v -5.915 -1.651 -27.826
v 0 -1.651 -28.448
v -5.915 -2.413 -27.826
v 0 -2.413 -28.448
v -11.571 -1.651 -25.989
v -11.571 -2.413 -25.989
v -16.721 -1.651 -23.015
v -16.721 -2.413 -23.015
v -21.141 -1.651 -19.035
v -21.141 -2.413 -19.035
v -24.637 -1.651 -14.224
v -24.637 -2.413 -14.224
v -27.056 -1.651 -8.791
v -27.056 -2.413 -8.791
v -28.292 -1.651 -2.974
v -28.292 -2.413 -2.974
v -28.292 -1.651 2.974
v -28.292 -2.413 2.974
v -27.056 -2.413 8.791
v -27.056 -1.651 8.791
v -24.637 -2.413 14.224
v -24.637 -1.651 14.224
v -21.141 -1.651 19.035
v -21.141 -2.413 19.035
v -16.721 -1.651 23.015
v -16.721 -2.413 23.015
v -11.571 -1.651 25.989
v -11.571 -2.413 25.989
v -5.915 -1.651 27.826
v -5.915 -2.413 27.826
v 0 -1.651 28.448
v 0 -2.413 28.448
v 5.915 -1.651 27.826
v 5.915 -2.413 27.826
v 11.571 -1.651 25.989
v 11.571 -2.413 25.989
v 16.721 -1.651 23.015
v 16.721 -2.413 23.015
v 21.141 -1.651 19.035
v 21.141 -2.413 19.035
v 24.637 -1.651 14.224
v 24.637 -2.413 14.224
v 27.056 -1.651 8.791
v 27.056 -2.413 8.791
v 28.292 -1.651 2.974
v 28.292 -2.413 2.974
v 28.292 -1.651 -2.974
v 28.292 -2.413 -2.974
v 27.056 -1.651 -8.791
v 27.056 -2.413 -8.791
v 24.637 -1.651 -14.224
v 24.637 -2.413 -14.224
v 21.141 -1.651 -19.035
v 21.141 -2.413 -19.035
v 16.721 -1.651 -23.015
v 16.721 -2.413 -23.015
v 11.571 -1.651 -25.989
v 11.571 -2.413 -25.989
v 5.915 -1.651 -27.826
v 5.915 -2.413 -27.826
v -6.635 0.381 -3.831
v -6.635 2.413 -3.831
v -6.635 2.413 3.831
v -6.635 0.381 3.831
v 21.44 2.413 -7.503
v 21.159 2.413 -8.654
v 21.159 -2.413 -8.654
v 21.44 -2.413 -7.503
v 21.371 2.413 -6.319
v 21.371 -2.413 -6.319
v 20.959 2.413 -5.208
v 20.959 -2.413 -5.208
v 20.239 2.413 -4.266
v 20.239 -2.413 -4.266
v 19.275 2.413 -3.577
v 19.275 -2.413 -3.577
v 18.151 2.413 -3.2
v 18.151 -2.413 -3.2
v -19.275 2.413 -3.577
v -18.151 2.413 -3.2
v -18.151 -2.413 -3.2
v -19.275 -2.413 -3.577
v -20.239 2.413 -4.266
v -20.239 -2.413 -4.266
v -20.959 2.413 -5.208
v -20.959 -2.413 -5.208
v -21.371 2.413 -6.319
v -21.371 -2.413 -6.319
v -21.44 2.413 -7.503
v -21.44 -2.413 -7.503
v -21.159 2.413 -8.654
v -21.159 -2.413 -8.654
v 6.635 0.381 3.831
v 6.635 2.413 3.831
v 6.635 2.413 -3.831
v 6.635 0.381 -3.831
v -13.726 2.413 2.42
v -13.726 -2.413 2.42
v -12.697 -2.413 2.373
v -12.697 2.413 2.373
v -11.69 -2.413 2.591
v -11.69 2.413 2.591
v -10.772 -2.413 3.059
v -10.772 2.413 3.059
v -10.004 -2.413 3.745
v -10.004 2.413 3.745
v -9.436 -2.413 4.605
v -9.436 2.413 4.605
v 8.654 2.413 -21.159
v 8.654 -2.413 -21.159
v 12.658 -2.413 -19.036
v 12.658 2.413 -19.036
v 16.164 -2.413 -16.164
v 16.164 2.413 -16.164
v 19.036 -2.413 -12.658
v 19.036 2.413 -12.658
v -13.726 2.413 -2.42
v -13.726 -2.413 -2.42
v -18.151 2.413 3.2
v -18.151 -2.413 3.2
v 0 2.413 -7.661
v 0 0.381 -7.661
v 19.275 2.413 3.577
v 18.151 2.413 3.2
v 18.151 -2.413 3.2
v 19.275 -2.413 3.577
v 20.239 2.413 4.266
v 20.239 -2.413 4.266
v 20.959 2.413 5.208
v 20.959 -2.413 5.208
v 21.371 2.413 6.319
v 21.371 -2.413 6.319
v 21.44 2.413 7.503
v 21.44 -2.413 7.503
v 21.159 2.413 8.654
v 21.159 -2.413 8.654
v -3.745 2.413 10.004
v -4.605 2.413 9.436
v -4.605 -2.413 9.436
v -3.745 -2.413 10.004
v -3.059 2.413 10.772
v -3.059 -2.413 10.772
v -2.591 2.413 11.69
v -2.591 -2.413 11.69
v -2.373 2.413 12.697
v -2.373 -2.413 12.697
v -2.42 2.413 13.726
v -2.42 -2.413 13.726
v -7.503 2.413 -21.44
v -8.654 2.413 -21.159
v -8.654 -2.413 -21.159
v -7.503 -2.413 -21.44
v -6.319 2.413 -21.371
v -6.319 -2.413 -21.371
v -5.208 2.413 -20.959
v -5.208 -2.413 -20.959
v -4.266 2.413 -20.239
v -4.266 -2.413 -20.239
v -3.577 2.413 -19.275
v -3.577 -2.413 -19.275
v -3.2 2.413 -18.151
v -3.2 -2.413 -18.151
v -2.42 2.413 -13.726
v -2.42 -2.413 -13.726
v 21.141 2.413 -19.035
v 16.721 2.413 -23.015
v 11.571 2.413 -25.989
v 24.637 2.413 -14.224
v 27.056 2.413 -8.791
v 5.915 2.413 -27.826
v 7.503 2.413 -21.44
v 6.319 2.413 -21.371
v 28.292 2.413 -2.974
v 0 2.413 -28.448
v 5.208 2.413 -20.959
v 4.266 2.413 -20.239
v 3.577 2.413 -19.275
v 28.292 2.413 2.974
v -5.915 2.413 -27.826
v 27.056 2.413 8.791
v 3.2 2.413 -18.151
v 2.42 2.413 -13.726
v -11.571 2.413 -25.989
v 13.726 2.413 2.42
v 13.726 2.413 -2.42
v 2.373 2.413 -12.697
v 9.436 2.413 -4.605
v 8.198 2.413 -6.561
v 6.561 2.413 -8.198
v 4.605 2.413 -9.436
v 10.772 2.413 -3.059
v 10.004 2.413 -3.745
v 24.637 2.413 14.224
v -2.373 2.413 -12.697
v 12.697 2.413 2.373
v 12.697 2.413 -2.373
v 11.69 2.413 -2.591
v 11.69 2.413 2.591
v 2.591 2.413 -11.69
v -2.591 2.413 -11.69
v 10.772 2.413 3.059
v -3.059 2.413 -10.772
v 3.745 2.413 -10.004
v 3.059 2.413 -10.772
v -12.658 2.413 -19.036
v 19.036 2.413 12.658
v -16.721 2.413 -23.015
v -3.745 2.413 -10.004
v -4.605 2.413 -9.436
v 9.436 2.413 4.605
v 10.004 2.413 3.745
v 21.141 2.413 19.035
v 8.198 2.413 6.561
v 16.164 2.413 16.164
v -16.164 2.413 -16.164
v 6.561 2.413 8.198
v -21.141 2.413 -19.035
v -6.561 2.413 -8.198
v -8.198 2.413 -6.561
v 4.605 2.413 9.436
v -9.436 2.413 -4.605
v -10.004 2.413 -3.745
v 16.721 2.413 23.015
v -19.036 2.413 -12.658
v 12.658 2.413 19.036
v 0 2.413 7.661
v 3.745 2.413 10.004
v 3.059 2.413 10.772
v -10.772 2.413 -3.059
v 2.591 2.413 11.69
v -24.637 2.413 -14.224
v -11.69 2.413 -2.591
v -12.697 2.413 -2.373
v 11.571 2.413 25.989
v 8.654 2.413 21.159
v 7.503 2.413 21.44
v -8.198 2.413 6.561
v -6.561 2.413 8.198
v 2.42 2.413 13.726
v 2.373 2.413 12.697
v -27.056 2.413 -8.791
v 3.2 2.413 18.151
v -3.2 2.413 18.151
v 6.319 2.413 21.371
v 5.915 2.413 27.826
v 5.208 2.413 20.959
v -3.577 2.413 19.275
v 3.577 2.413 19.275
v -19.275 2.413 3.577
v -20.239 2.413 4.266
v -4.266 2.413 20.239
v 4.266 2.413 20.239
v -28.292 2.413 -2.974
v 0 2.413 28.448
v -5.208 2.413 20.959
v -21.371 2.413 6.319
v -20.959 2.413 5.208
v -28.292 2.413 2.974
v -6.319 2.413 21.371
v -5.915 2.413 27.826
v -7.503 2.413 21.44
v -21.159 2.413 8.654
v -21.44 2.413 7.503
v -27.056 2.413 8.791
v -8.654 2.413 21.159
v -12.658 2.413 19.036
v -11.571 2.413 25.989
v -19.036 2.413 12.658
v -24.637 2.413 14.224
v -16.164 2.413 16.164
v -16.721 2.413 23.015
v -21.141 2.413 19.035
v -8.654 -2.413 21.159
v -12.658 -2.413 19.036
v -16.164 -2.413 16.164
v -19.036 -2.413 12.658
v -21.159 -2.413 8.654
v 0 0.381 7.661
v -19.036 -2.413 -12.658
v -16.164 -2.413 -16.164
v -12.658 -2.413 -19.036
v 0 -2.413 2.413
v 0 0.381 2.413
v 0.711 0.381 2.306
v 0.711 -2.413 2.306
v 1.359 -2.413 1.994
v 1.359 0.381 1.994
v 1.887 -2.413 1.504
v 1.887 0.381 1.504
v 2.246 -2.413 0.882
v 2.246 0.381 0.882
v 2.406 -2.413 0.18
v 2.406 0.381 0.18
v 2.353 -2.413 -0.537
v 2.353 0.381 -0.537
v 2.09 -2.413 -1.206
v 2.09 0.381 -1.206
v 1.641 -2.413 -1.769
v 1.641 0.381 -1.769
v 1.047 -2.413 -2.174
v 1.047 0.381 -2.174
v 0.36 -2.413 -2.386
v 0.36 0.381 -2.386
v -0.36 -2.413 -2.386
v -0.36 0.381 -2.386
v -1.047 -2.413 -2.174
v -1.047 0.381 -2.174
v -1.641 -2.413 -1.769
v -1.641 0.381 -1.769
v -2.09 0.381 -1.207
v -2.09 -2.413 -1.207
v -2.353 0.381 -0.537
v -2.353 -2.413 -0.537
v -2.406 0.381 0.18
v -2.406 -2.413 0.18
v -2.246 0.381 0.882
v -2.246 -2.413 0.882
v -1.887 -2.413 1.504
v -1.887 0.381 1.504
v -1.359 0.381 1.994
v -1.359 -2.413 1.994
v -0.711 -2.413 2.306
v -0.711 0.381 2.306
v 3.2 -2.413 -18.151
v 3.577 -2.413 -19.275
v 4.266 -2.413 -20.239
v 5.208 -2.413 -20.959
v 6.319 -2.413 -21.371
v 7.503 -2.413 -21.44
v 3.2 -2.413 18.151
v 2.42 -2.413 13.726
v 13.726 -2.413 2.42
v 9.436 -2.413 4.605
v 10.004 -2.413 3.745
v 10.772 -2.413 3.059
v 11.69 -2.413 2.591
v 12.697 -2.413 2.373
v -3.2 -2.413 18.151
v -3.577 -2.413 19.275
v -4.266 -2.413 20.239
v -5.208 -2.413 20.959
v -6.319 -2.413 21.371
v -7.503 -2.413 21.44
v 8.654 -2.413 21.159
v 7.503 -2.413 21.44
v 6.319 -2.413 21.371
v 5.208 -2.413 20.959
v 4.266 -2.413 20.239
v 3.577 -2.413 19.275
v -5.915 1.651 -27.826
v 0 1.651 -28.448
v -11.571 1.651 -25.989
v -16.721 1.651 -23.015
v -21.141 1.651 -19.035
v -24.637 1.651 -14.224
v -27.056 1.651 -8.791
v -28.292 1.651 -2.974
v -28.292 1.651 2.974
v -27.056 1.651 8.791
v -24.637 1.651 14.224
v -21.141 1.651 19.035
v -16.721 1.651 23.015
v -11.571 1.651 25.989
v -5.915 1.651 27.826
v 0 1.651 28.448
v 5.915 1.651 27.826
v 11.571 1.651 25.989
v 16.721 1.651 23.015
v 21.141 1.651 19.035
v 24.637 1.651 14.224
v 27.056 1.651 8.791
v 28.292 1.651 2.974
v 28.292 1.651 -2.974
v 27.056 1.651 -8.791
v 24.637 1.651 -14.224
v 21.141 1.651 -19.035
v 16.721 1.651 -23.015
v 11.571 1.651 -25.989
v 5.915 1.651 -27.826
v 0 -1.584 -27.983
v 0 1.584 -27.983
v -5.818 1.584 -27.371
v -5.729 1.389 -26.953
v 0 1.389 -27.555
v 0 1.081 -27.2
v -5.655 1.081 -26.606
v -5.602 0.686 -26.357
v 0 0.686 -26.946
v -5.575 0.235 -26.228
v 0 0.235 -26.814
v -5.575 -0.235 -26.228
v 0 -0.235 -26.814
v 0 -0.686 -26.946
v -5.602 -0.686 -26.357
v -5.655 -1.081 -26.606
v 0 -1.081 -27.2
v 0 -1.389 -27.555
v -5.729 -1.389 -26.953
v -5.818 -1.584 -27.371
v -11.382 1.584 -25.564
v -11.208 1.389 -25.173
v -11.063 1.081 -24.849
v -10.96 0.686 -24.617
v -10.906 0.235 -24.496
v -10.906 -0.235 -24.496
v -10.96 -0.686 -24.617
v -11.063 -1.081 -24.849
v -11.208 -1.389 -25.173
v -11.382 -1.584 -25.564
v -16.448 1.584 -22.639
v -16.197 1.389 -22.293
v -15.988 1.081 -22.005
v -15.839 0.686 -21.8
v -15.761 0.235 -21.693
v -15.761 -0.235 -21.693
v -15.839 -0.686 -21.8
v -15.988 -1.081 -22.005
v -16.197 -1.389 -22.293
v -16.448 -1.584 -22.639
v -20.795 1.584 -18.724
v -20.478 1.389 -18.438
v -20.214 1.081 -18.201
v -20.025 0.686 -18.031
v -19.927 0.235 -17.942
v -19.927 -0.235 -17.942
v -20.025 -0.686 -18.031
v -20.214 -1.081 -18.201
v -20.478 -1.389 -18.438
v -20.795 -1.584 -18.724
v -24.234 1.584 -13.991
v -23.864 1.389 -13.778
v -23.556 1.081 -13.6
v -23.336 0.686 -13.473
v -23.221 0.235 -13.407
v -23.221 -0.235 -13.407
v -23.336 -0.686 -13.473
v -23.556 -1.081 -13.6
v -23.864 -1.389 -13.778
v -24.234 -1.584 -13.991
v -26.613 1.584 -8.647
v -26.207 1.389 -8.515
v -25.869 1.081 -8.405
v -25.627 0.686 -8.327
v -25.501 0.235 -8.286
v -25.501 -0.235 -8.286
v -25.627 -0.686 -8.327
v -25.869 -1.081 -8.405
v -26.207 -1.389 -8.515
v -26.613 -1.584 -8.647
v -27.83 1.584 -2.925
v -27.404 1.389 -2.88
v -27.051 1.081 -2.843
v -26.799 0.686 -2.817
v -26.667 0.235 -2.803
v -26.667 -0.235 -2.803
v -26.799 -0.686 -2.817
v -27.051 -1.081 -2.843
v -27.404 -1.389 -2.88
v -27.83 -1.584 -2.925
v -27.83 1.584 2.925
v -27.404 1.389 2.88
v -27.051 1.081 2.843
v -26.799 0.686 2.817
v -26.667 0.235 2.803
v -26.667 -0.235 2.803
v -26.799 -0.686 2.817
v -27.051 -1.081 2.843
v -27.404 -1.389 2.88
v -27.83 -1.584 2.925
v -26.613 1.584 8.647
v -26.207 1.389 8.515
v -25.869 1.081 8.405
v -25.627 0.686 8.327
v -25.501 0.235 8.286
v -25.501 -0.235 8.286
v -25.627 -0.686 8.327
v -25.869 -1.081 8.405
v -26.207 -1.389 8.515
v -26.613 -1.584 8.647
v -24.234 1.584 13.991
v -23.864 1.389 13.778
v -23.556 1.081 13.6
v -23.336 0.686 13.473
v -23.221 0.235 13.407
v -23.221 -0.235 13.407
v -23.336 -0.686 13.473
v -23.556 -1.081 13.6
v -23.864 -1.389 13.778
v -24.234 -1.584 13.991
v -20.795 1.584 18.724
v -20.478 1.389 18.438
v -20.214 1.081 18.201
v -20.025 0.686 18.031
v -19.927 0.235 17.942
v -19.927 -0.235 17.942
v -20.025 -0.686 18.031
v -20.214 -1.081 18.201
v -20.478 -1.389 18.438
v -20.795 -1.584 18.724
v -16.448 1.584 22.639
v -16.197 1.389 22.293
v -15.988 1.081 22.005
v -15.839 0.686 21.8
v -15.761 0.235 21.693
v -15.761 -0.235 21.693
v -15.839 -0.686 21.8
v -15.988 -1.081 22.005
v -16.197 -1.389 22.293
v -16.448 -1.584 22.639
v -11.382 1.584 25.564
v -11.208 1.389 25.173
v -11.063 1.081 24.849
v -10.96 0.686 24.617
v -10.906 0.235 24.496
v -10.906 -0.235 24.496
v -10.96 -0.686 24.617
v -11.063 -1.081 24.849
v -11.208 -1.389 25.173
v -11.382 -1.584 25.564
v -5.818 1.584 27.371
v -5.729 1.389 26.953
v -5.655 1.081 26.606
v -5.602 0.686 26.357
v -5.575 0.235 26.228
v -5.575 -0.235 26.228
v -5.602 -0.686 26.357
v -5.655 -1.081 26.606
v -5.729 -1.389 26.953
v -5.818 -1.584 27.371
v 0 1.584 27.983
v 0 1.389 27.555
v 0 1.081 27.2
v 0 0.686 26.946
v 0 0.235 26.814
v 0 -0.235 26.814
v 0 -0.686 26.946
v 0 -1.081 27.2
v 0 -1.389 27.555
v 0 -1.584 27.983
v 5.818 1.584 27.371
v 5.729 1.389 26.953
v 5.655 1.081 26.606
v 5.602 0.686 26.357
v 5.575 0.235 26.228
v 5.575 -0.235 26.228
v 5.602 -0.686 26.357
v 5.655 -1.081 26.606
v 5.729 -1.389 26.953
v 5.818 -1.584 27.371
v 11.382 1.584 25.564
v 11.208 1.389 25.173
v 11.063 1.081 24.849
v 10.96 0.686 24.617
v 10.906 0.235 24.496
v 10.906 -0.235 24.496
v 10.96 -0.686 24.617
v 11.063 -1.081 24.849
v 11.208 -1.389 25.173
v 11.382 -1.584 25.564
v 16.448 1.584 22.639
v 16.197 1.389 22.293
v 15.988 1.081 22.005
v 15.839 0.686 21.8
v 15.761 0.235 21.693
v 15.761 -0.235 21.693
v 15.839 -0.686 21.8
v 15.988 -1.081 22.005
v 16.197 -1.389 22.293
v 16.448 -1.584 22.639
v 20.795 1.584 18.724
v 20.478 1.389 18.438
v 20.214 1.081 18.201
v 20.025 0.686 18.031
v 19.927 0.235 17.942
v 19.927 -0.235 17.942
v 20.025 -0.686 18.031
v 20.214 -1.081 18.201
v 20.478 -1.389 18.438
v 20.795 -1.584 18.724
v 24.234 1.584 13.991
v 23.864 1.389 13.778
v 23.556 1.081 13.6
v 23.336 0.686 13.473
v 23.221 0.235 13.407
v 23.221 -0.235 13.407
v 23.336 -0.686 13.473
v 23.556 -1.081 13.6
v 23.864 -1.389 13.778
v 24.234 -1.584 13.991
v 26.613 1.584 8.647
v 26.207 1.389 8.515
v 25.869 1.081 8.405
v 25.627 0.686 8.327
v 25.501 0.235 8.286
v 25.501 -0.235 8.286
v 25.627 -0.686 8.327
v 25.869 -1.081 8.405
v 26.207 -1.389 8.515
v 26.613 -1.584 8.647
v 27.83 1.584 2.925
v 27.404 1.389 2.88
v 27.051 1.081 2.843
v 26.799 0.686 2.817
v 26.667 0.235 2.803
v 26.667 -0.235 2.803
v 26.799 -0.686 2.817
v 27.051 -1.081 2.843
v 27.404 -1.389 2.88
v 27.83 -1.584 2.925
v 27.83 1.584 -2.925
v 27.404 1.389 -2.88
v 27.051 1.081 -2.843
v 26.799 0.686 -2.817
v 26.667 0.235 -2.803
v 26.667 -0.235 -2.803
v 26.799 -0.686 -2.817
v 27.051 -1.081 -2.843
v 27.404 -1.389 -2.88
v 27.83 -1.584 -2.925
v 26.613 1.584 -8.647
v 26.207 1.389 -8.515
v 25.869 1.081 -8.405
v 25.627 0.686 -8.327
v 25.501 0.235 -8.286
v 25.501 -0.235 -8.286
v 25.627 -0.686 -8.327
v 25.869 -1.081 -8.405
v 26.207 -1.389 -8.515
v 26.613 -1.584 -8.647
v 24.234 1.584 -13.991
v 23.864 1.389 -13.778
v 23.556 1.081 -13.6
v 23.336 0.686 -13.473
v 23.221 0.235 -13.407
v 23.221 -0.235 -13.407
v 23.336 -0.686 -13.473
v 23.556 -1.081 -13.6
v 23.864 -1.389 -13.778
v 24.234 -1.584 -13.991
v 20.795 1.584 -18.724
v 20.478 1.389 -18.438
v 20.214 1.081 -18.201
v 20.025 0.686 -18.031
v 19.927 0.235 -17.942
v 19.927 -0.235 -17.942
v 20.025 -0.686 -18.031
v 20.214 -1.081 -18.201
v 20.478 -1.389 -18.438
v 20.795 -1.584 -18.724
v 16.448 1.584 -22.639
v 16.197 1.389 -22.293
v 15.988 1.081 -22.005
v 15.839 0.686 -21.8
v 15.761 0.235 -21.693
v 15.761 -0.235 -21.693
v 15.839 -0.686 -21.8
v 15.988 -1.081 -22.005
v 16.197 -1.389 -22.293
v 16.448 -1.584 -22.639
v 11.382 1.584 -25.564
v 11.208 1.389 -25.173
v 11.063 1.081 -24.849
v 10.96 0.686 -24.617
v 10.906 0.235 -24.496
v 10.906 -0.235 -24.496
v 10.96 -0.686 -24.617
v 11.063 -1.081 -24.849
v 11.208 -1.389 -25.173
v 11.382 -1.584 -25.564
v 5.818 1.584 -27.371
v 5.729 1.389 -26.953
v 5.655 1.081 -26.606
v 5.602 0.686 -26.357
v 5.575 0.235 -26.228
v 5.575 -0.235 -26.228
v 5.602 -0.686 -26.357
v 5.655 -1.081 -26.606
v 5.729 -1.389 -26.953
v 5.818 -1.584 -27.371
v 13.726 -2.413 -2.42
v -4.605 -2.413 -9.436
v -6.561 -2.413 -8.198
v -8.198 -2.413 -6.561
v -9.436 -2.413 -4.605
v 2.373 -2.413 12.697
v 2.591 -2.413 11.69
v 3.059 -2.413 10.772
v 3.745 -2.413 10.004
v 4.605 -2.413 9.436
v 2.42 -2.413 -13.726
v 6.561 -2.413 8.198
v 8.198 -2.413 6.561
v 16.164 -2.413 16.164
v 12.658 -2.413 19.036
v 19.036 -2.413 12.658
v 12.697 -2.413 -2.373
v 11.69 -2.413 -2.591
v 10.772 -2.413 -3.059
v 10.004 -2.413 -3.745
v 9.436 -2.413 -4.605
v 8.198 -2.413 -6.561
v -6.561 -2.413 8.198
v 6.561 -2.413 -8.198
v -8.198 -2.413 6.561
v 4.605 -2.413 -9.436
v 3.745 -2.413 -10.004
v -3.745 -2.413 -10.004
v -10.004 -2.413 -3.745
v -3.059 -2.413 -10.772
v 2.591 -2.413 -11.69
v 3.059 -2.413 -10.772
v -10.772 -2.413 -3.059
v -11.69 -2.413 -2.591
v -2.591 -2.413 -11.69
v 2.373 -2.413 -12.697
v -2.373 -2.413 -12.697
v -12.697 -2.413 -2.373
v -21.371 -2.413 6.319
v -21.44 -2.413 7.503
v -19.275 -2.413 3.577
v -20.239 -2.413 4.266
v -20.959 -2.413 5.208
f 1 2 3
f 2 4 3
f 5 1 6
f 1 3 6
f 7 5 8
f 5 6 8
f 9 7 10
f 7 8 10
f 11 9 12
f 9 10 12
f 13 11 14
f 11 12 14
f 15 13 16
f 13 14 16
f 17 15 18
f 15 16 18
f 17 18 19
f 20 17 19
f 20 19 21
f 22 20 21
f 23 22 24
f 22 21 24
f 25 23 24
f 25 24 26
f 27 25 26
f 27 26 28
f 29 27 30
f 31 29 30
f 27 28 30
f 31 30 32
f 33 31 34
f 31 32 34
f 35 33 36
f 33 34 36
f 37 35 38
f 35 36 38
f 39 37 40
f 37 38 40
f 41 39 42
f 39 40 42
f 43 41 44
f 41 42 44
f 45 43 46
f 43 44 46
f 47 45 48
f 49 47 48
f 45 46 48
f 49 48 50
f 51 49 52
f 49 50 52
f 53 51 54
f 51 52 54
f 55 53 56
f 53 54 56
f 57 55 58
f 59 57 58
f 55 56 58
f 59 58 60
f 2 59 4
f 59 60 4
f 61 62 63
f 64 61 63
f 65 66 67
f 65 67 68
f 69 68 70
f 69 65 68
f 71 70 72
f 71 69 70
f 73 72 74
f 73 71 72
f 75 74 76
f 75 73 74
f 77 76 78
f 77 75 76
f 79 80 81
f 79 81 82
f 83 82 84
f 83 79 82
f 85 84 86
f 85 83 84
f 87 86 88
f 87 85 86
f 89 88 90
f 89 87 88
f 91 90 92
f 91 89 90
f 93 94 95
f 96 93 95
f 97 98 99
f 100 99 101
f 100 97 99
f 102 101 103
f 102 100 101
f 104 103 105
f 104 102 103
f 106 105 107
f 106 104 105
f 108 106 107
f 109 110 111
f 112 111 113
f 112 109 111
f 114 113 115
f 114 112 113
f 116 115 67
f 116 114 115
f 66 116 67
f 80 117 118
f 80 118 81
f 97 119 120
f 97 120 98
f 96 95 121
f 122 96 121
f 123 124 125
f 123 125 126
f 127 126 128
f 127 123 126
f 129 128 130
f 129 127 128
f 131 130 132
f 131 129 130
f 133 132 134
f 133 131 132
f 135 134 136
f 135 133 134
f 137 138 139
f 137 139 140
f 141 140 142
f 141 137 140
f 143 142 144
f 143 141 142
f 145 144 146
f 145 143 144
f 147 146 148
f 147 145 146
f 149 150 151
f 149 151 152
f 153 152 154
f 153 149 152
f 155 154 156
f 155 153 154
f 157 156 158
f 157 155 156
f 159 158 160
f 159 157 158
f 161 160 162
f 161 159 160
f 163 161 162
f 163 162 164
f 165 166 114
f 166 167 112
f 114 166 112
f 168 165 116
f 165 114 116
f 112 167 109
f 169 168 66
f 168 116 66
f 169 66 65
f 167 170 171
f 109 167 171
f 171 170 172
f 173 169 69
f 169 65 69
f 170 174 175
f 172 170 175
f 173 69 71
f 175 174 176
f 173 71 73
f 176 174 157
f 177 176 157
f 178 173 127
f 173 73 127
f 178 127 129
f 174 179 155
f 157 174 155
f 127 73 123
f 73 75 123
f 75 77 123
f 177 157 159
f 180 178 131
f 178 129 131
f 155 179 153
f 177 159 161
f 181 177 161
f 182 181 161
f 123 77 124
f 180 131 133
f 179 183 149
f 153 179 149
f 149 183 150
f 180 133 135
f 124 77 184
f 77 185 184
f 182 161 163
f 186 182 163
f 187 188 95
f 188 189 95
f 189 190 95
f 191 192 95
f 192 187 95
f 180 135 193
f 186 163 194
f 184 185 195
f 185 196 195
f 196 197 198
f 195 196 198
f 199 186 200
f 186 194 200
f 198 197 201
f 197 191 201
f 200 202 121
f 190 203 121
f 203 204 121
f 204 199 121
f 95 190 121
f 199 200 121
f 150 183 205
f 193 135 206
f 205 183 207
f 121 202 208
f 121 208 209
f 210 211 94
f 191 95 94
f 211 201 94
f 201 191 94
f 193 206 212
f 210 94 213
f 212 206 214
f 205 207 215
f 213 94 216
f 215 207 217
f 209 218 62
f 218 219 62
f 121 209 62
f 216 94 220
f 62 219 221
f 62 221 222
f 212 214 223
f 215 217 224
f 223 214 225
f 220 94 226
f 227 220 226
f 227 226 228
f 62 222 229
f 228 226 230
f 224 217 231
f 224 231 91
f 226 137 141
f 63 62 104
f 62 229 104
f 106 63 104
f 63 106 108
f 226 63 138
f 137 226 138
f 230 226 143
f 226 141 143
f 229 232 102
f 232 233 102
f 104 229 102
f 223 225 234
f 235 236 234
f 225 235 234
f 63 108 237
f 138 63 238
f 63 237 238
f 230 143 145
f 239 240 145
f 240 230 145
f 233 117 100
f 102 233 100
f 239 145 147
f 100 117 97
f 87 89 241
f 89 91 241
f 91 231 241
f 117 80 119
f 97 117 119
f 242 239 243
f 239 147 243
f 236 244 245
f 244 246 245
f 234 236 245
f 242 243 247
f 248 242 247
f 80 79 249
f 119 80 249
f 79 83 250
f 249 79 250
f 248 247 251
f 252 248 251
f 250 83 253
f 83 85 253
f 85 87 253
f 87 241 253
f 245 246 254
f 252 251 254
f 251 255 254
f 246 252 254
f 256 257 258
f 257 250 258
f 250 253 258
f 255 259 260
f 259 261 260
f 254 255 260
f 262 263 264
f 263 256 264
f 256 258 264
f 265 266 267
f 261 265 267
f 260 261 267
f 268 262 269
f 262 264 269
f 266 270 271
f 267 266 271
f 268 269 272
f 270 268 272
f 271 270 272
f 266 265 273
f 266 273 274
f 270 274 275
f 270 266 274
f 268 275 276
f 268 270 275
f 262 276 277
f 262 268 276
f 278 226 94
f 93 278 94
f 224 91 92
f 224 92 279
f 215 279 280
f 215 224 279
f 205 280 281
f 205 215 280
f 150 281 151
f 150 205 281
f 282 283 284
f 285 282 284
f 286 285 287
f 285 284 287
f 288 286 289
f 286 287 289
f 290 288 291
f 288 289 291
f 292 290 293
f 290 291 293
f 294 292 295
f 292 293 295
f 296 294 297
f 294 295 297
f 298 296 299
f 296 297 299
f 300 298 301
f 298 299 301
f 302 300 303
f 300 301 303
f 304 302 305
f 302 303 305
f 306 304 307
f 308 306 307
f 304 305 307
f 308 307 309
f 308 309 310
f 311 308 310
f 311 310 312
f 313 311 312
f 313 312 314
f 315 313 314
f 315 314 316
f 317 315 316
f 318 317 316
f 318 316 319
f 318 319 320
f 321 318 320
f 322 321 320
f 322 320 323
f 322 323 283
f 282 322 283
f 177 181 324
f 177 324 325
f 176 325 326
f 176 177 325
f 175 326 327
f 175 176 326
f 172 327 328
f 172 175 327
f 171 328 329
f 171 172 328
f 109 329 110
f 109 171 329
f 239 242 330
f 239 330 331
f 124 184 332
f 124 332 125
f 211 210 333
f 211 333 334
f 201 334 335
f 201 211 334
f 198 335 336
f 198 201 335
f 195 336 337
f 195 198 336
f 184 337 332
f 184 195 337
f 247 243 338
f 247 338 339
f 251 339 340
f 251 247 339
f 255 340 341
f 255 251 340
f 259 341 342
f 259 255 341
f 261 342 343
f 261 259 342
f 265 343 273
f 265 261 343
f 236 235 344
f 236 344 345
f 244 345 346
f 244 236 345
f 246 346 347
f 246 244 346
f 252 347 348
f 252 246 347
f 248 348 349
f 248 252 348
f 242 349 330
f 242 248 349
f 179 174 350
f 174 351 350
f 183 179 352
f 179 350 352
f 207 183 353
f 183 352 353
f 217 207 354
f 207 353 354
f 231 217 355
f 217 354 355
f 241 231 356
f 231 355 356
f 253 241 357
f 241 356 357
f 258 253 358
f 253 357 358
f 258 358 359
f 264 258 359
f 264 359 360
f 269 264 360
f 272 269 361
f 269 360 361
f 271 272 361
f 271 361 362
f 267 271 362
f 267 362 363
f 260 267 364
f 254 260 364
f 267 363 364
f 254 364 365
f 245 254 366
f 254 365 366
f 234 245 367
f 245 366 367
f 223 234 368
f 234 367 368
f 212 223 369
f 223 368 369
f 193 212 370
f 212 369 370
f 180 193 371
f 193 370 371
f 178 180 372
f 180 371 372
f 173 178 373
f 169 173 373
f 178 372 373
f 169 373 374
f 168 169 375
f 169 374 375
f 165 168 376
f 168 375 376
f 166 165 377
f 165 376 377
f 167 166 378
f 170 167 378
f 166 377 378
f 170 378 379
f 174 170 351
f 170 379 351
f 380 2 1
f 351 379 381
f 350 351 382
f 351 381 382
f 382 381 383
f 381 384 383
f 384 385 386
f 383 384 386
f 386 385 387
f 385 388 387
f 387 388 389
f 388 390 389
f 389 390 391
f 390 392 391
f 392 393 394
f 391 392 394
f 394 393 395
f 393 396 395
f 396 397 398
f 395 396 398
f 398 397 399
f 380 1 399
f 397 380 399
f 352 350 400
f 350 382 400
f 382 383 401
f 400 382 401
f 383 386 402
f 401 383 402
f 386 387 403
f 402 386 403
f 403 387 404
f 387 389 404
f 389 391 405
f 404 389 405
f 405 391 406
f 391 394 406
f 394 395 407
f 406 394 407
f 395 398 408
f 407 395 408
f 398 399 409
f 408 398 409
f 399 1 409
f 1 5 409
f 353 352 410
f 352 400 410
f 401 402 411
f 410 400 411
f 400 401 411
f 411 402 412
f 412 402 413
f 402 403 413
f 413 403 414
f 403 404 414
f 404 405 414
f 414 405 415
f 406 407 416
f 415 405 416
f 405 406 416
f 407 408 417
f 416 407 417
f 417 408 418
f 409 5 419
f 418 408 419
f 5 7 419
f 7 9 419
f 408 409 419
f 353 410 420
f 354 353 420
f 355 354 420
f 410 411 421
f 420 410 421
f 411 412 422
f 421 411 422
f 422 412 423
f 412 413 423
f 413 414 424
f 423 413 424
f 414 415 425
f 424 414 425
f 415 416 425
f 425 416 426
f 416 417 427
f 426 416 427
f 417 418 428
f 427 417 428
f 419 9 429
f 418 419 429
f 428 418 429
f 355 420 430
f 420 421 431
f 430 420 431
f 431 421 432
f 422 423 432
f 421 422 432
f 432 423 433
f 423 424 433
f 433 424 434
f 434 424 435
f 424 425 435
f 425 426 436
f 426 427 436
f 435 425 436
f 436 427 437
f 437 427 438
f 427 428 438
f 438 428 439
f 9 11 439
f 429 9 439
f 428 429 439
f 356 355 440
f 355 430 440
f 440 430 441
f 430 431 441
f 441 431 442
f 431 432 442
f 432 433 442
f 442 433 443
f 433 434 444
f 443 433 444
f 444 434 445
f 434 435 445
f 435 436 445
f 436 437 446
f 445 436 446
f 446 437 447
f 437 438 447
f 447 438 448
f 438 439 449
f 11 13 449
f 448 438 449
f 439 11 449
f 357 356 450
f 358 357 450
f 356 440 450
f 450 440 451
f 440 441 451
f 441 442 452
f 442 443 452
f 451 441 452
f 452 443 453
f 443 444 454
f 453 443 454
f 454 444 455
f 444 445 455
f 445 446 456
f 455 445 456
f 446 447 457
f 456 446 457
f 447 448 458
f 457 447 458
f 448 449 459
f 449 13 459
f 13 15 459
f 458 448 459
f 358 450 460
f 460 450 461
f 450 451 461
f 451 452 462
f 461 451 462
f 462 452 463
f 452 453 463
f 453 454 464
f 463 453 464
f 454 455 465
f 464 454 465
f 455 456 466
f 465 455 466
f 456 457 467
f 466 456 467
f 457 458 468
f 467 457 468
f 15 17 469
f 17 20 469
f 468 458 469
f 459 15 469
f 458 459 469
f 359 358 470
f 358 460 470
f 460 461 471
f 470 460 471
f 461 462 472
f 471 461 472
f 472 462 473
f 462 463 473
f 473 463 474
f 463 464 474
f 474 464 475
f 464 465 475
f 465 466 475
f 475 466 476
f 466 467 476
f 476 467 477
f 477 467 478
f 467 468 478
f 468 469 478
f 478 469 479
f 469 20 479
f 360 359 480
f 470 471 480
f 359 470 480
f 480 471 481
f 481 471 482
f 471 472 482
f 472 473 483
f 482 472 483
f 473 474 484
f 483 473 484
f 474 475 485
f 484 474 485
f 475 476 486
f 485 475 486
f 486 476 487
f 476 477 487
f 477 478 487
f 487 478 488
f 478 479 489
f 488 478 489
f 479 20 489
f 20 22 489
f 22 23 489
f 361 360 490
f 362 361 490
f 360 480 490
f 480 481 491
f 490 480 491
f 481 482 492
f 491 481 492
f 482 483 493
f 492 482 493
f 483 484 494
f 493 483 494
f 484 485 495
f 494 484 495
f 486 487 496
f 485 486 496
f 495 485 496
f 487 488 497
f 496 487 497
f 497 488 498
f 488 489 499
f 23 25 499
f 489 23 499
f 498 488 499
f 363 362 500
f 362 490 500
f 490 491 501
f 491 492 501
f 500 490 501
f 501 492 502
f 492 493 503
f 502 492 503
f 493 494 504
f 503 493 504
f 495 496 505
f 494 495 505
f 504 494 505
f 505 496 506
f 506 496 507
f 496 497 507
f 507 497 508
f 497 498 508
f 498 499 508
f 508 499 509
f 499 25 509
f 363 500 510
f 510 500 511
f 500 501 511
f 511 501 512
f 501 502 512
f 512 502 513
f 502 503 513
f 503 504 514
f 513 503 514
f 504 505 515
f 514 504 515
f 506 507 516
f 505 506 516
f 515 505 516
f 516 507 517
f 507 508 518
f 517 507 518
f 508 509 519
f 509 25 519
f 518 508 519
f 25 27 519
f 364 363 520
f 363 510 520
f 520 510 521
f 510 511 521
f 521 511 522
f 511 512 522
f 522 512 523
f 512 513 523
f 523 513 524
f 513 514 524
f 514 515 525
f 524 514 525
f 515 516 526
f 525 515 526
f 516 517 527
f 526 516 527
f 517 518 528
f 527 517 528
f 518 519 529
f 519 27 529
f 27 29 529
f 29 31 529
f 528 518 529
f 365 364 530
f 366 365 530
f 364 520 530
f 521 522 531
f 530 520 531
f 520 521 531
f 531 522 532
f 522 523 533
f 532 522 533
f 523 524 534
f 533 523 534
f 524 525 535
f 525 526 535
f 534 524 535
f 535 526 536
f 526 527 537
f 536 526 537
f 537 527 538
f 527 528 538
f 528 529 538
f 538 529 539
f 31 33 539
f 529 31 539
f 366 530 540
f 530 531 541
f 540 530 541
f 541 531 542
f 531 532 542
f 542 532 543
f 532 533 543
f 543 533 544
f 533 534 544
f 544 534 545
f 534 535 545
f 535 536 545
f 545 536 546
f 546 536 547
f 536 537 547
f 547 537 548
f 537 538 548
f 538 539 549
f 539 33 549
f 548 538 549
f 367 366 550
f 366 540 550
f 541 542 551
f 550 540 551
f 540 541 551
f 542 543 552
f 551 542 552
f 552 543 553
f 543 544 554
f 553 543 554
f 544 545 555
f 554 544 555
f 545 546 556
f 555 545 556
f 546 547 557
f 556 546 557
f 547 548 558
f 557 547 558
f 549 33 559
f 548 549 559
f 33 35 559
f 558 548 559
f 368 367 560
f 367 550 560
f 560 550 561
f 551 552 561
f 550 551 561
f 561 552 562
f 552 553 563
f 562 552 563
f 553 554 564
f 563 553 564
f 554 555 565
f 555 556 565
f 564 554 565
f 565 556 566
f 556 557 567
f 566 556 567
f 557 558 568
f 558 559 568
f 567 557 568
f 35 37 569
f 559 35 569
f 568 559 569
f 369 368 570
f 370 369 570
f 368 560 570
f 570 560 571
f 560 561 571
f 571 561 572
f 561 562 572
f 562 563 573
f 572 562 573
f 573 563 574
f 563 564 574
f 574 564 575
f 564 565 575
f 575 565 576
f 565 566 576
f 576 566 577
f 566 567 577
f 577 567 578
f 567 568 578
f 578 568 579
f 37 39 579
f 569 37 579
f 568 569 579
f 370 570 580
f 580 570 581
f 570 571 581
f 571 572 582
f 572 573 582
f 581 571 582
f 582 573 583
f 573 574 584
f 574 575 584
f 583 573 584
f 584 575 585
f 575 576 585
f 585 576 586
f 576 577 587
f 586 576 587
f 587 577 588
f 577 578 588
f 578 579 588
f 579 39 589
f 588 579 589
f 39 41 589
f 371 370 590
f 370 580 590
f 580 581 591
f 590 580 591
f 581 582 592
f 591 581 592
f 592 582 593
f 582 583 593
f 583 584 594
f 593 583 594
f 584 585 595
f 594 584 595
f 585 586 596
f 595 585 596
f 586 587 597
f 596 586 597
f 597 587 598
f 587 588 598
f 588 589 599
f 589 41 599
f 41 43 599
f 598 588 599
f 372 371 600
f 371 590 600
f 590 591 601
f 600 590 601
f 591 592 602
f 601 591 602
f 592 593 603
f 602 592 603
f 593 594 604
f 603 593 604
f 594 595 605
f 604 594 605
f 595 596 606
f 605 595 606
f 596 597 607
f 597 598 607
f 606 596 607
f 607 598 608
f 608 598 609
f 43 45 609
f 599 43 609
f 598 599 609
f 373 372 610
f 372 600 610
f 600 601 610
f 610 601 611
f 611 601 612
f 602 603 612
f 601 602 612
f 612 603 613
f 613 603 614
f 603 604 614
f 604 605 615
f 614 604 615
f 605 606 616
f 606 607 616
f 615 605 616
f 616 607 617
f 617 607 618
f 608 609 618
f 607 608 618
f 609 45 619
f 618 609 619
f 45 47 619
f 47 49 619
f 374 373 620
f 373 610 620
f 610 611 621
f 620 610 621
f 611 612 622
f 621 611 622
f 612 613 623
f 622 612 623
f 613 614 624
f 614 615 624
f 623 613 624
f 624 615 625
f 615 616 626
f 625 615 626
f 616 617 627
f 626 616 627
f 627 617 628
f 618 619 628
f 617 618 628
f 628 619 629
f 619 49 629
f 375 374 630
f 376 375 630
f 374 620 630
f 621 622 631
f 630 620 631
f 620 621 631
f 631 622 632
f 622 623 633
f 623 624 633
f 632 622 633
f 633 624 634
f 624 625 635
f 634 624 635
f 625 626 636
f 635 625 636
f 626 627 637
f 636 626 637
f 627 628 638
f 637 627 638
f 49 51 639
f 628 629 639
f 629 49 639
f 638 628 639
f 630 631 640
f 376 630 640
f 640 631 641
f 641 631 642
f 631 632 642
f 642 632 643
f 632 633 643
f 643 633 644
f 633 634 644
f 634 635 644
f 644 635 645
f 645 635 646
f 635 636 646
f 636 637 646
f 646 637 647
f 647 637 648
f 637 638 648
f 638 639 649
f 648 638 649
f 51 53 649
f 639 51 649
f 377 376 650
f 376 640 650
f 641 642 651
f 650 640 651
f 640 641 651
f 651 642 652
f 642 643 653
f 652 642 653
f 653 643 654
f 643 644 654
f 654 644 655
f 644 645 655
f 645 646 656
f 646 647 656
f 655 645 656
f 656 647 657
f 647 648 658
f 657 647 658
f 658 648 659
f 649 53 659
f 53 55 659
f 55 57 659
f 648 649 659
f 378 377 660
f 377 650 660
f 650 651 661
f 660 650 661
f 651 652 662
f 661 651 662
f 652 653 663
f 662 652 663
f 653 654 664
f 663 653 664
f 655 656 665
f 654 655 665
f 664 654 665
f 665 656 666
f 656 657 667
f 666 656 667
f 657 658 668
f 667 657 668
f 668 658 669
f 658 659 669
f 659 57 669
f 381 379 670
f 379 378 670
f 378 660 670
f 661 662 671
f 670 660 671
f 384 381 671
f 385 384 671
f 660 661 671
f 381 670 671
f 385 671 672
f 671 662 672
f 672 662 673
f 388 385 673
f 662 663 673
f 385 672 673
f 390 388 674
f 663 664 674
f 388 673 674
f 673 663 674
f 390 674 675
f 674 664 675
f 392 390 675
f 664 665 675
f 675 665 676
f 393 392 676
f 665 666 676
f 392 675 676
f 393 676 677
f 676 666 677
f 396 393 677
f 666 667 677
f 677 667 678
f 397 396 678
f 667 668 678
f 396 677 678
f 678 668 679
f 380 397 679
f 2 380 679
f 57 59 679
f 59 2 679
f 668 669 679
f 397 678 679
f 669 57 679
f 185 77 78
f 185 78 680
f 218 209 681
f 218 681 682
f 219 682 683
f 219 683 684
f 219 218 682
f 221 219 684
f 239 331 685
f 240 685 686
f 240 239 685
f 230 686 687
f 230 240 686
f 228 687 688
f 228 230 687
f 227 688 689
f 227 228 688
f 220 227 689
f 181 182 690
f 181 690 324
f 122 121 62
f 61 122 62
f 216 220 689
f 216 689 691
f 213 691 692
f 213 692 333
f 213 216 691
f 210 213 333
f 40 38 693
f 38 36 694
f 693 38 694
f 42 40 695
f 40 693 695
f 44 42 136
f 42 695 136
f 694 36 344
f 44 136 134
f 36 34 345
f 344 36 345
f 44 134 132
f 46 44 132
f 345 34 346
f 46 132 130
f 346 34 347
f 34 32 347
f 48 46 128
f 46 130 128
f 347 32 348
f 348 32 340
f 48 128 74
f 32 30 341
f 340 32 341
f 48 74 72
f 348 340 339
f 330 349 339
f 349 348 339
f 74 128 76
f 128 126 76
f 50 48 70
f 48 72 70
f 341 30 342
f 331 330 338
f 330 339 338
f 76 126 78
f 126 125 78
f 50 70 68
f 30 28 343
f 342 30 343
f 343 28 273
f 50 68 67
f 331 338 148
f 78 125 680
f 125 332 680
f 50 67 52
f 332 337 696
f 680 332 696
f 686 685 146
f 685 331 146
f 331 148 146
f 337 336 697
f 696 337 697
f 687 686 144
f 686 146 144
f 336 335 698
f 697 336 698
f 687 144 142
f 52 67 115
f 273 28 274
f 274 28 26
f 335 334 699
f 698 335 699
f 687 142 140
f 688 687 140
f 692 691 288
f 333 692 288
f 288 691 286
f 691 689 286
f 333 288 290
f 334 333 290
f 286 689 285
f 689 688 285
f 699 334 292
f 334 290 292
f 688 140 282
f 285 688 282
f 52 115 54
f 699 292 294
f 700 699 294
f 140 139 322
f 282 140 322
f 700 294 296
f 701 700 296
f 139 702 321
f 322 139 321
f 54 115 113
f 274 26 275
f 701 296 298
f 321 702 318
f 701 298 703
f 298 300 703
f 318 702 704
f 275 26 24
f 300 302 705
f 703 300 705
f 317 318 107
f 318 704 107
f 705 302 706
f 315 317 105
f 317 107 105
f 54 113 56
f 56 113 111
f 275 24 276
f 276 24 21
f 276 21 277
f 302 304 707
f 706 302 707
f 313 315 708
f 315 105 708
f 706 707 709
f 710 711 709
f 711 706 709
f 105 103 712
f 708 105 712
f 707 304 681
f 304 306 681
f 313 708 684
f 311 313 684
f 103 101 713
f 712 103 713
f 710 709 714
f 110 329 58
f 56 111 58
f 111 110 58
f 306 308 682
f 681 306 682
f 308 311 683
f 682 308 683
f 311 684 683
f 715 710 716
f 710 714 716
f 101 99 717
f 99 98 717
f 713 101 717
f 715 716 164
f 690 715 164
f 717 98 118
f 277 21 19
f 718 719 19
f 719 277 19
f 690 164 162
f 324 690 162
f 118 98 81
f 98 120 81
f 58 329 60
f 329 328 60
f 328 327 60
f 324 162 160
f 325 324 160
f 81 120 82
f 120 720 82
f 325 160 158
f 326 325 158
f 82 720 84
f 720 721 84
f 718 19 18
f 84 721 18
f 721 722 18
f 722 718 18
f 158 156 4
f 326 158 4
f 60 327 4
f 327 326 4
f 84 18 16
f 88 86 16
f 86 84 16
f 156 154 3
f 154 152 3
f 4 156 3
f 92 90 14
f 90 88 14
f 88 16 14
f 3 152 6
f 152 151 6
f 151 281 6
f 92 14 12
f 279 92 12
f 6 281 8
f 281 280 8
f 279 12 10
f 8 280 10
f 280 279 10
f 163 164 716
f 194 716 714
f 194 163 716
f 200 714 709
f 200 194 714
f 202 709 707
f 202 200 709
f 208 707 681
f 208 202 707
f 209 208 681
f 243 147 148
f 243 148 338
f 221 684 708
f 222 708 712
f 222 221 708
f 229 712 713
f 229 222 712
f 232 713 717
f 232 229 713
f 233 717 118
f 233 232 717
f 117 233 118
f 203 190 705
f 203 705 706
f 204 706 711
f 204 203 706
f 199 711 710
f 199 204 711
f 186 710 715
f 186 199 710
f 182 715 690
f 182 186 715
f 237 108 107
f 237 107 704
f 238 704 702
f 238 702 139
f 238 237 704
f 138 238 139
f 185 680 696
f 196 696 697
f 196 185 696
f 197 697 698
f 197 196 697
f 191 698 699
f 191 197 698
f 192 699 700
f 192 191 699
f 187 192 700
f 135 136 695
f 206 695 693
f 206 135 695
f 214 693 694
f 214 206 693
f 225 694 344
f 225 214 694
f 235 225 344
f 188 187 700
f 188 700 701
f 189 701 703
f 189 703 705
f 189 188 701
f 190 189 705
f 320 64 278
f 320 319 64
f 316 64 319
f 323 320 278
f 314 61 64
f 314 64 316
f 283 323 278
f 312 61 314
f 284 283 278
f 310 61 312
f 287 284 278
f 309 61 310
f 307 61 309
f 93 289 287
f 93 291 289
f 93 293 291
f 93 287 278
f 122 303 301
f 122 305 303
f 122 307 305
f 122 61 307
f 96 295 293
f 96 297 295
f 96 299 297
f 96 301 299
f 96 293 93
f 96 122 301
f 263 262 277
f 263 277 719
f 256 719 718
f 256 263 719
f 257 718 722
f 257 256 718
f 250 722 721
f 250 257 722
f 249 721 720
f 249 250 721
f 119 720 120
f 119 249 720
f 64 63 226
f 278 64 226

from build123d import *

# Parameters (mm, degrees)
CUT_EXTRUDE1_DEPTH = 41.519966486
CIRPATTERN1_COUNT  = 4
CUT_EXTRUDE2_DEPTH = 2.032
SKETCH7_R          = 2.413
CUT_EXTRUDE3_DEPTH = 41.519966486


with BuildPart() as part:
    # Sketch1 → Revolve1 (revolve)
    with BuildSketch(Plane(origin=(0, 0, 0), x_dir=(0, 0, -1), z_dir=(1, 0, 0))):
        with BuildLine():
            Line((0, -1.651), (0, 1.651))
            Line((0, 1.651), (0, 2.413))
            Line((0, 2.413), (-28.448, 2.413))
            Line((-28.448, 2.413), (-28.448, 1.651))
            ThreePointArc((-28.448, 1.651), (-26.797, 0), (-28.448, -1.651))
            Line((-28.448, -1.651), (-28.448, -2.413))
            Line((-28.448, -2.413), (0, -2.413))
            Line((0, -2.413), (0, -1.651))
        make_face()
    revolve(axis=Axis((0, -1.651, 0), (0, 1, 0)))

    # Sketch4 → Cut-Extrude1 (cut, through all)
    with BuildSketch(Plane(origin=(0, 2.413, 0), x_dir=(1, 0, 0), z_dir=(0, 1, 0))):
        with BuildLine():
            Line((-18.150933962, -3.200499383), (-13.725620051, -2.420197142))
            ThreePointArc((-13.725620051, -2.420197142), (-11.215481947, -2.795189817), (-9.436261178, -4.605103146))
            ThreePointArc((-9.436261178, -4.605103146), (-7.424621202, -7.424621202), (-4.605103146, -9.436261178))
            ThreePointArc((-4.605103146, -9.436261178), (-2.795189817, -11.215481947), (-2.420197142, -13.725620051))
            Line((-2.420197142, -13.725620051), (-3.200499383, -18.150933962))
            ThreePointArc((-3.200499383, -18.150933962), (-5.207970247, -20.958954952), (-8.653989227, -21.158640563))
            ThreePointArc((-8.653989227, -21.158640563), (-16.164461018, -16.164461018), (-21.158640563, -8.653989227))
            ThreePointArc((-21.158640563, -8.653989227), (-20.958954952, -5.207970247), (-18.150933962, -3.200499383))
        make_face()
    cut_extrude1 = extrude(amount=-CUT_EXTRUDE1_DEPTH, mode=Mode.SUBTRACT)

    # CirPattern1: Cut-Extrude1 ×4 about axis
    cirpattern1_axis = Axis((0, 2.413, 0), (0, -1, 0))
    for i in range(1, CIRPATTERN1_COUNT):
        add(cut_extrude1.rotate(cirpattern1_axis, i * 360 / CIRPATTERN1_COUNT), mode=Mode.SUBTRACT)

    # Sketch6 → Cut-Extrude2 (cut)
    with BuildSketch(Plane(origin=(0, 2.413, 0), x_dir=(1, 0, 0), z_dir=(0, 1, 0))):
        Polygon((0, 7.661438072), (-6.635, 3.830719036), (-6.635, -3.830719036), (0, -7.661438072), (6.635, -3.830719036), (6.635, 3.830719036), align=None)
    extrude(amount=-CUT_EXTRUDE2_DEPTH, mode=Mode.SUBTRACT)

    # Sketch7 → Cut-Extrude3 (cut, through all)
    with BuildSketch(Plane(origin=(0, 2.413, 0), x_dir=(1, 0, 0), z_dir=(0, 1, 0))):
        Circle(SKETCH7_R)
    extrude(amount=-CUT_EXTRUDE3_DEPTH, mode=Mode.SUBTRACT)


solid = part.part
